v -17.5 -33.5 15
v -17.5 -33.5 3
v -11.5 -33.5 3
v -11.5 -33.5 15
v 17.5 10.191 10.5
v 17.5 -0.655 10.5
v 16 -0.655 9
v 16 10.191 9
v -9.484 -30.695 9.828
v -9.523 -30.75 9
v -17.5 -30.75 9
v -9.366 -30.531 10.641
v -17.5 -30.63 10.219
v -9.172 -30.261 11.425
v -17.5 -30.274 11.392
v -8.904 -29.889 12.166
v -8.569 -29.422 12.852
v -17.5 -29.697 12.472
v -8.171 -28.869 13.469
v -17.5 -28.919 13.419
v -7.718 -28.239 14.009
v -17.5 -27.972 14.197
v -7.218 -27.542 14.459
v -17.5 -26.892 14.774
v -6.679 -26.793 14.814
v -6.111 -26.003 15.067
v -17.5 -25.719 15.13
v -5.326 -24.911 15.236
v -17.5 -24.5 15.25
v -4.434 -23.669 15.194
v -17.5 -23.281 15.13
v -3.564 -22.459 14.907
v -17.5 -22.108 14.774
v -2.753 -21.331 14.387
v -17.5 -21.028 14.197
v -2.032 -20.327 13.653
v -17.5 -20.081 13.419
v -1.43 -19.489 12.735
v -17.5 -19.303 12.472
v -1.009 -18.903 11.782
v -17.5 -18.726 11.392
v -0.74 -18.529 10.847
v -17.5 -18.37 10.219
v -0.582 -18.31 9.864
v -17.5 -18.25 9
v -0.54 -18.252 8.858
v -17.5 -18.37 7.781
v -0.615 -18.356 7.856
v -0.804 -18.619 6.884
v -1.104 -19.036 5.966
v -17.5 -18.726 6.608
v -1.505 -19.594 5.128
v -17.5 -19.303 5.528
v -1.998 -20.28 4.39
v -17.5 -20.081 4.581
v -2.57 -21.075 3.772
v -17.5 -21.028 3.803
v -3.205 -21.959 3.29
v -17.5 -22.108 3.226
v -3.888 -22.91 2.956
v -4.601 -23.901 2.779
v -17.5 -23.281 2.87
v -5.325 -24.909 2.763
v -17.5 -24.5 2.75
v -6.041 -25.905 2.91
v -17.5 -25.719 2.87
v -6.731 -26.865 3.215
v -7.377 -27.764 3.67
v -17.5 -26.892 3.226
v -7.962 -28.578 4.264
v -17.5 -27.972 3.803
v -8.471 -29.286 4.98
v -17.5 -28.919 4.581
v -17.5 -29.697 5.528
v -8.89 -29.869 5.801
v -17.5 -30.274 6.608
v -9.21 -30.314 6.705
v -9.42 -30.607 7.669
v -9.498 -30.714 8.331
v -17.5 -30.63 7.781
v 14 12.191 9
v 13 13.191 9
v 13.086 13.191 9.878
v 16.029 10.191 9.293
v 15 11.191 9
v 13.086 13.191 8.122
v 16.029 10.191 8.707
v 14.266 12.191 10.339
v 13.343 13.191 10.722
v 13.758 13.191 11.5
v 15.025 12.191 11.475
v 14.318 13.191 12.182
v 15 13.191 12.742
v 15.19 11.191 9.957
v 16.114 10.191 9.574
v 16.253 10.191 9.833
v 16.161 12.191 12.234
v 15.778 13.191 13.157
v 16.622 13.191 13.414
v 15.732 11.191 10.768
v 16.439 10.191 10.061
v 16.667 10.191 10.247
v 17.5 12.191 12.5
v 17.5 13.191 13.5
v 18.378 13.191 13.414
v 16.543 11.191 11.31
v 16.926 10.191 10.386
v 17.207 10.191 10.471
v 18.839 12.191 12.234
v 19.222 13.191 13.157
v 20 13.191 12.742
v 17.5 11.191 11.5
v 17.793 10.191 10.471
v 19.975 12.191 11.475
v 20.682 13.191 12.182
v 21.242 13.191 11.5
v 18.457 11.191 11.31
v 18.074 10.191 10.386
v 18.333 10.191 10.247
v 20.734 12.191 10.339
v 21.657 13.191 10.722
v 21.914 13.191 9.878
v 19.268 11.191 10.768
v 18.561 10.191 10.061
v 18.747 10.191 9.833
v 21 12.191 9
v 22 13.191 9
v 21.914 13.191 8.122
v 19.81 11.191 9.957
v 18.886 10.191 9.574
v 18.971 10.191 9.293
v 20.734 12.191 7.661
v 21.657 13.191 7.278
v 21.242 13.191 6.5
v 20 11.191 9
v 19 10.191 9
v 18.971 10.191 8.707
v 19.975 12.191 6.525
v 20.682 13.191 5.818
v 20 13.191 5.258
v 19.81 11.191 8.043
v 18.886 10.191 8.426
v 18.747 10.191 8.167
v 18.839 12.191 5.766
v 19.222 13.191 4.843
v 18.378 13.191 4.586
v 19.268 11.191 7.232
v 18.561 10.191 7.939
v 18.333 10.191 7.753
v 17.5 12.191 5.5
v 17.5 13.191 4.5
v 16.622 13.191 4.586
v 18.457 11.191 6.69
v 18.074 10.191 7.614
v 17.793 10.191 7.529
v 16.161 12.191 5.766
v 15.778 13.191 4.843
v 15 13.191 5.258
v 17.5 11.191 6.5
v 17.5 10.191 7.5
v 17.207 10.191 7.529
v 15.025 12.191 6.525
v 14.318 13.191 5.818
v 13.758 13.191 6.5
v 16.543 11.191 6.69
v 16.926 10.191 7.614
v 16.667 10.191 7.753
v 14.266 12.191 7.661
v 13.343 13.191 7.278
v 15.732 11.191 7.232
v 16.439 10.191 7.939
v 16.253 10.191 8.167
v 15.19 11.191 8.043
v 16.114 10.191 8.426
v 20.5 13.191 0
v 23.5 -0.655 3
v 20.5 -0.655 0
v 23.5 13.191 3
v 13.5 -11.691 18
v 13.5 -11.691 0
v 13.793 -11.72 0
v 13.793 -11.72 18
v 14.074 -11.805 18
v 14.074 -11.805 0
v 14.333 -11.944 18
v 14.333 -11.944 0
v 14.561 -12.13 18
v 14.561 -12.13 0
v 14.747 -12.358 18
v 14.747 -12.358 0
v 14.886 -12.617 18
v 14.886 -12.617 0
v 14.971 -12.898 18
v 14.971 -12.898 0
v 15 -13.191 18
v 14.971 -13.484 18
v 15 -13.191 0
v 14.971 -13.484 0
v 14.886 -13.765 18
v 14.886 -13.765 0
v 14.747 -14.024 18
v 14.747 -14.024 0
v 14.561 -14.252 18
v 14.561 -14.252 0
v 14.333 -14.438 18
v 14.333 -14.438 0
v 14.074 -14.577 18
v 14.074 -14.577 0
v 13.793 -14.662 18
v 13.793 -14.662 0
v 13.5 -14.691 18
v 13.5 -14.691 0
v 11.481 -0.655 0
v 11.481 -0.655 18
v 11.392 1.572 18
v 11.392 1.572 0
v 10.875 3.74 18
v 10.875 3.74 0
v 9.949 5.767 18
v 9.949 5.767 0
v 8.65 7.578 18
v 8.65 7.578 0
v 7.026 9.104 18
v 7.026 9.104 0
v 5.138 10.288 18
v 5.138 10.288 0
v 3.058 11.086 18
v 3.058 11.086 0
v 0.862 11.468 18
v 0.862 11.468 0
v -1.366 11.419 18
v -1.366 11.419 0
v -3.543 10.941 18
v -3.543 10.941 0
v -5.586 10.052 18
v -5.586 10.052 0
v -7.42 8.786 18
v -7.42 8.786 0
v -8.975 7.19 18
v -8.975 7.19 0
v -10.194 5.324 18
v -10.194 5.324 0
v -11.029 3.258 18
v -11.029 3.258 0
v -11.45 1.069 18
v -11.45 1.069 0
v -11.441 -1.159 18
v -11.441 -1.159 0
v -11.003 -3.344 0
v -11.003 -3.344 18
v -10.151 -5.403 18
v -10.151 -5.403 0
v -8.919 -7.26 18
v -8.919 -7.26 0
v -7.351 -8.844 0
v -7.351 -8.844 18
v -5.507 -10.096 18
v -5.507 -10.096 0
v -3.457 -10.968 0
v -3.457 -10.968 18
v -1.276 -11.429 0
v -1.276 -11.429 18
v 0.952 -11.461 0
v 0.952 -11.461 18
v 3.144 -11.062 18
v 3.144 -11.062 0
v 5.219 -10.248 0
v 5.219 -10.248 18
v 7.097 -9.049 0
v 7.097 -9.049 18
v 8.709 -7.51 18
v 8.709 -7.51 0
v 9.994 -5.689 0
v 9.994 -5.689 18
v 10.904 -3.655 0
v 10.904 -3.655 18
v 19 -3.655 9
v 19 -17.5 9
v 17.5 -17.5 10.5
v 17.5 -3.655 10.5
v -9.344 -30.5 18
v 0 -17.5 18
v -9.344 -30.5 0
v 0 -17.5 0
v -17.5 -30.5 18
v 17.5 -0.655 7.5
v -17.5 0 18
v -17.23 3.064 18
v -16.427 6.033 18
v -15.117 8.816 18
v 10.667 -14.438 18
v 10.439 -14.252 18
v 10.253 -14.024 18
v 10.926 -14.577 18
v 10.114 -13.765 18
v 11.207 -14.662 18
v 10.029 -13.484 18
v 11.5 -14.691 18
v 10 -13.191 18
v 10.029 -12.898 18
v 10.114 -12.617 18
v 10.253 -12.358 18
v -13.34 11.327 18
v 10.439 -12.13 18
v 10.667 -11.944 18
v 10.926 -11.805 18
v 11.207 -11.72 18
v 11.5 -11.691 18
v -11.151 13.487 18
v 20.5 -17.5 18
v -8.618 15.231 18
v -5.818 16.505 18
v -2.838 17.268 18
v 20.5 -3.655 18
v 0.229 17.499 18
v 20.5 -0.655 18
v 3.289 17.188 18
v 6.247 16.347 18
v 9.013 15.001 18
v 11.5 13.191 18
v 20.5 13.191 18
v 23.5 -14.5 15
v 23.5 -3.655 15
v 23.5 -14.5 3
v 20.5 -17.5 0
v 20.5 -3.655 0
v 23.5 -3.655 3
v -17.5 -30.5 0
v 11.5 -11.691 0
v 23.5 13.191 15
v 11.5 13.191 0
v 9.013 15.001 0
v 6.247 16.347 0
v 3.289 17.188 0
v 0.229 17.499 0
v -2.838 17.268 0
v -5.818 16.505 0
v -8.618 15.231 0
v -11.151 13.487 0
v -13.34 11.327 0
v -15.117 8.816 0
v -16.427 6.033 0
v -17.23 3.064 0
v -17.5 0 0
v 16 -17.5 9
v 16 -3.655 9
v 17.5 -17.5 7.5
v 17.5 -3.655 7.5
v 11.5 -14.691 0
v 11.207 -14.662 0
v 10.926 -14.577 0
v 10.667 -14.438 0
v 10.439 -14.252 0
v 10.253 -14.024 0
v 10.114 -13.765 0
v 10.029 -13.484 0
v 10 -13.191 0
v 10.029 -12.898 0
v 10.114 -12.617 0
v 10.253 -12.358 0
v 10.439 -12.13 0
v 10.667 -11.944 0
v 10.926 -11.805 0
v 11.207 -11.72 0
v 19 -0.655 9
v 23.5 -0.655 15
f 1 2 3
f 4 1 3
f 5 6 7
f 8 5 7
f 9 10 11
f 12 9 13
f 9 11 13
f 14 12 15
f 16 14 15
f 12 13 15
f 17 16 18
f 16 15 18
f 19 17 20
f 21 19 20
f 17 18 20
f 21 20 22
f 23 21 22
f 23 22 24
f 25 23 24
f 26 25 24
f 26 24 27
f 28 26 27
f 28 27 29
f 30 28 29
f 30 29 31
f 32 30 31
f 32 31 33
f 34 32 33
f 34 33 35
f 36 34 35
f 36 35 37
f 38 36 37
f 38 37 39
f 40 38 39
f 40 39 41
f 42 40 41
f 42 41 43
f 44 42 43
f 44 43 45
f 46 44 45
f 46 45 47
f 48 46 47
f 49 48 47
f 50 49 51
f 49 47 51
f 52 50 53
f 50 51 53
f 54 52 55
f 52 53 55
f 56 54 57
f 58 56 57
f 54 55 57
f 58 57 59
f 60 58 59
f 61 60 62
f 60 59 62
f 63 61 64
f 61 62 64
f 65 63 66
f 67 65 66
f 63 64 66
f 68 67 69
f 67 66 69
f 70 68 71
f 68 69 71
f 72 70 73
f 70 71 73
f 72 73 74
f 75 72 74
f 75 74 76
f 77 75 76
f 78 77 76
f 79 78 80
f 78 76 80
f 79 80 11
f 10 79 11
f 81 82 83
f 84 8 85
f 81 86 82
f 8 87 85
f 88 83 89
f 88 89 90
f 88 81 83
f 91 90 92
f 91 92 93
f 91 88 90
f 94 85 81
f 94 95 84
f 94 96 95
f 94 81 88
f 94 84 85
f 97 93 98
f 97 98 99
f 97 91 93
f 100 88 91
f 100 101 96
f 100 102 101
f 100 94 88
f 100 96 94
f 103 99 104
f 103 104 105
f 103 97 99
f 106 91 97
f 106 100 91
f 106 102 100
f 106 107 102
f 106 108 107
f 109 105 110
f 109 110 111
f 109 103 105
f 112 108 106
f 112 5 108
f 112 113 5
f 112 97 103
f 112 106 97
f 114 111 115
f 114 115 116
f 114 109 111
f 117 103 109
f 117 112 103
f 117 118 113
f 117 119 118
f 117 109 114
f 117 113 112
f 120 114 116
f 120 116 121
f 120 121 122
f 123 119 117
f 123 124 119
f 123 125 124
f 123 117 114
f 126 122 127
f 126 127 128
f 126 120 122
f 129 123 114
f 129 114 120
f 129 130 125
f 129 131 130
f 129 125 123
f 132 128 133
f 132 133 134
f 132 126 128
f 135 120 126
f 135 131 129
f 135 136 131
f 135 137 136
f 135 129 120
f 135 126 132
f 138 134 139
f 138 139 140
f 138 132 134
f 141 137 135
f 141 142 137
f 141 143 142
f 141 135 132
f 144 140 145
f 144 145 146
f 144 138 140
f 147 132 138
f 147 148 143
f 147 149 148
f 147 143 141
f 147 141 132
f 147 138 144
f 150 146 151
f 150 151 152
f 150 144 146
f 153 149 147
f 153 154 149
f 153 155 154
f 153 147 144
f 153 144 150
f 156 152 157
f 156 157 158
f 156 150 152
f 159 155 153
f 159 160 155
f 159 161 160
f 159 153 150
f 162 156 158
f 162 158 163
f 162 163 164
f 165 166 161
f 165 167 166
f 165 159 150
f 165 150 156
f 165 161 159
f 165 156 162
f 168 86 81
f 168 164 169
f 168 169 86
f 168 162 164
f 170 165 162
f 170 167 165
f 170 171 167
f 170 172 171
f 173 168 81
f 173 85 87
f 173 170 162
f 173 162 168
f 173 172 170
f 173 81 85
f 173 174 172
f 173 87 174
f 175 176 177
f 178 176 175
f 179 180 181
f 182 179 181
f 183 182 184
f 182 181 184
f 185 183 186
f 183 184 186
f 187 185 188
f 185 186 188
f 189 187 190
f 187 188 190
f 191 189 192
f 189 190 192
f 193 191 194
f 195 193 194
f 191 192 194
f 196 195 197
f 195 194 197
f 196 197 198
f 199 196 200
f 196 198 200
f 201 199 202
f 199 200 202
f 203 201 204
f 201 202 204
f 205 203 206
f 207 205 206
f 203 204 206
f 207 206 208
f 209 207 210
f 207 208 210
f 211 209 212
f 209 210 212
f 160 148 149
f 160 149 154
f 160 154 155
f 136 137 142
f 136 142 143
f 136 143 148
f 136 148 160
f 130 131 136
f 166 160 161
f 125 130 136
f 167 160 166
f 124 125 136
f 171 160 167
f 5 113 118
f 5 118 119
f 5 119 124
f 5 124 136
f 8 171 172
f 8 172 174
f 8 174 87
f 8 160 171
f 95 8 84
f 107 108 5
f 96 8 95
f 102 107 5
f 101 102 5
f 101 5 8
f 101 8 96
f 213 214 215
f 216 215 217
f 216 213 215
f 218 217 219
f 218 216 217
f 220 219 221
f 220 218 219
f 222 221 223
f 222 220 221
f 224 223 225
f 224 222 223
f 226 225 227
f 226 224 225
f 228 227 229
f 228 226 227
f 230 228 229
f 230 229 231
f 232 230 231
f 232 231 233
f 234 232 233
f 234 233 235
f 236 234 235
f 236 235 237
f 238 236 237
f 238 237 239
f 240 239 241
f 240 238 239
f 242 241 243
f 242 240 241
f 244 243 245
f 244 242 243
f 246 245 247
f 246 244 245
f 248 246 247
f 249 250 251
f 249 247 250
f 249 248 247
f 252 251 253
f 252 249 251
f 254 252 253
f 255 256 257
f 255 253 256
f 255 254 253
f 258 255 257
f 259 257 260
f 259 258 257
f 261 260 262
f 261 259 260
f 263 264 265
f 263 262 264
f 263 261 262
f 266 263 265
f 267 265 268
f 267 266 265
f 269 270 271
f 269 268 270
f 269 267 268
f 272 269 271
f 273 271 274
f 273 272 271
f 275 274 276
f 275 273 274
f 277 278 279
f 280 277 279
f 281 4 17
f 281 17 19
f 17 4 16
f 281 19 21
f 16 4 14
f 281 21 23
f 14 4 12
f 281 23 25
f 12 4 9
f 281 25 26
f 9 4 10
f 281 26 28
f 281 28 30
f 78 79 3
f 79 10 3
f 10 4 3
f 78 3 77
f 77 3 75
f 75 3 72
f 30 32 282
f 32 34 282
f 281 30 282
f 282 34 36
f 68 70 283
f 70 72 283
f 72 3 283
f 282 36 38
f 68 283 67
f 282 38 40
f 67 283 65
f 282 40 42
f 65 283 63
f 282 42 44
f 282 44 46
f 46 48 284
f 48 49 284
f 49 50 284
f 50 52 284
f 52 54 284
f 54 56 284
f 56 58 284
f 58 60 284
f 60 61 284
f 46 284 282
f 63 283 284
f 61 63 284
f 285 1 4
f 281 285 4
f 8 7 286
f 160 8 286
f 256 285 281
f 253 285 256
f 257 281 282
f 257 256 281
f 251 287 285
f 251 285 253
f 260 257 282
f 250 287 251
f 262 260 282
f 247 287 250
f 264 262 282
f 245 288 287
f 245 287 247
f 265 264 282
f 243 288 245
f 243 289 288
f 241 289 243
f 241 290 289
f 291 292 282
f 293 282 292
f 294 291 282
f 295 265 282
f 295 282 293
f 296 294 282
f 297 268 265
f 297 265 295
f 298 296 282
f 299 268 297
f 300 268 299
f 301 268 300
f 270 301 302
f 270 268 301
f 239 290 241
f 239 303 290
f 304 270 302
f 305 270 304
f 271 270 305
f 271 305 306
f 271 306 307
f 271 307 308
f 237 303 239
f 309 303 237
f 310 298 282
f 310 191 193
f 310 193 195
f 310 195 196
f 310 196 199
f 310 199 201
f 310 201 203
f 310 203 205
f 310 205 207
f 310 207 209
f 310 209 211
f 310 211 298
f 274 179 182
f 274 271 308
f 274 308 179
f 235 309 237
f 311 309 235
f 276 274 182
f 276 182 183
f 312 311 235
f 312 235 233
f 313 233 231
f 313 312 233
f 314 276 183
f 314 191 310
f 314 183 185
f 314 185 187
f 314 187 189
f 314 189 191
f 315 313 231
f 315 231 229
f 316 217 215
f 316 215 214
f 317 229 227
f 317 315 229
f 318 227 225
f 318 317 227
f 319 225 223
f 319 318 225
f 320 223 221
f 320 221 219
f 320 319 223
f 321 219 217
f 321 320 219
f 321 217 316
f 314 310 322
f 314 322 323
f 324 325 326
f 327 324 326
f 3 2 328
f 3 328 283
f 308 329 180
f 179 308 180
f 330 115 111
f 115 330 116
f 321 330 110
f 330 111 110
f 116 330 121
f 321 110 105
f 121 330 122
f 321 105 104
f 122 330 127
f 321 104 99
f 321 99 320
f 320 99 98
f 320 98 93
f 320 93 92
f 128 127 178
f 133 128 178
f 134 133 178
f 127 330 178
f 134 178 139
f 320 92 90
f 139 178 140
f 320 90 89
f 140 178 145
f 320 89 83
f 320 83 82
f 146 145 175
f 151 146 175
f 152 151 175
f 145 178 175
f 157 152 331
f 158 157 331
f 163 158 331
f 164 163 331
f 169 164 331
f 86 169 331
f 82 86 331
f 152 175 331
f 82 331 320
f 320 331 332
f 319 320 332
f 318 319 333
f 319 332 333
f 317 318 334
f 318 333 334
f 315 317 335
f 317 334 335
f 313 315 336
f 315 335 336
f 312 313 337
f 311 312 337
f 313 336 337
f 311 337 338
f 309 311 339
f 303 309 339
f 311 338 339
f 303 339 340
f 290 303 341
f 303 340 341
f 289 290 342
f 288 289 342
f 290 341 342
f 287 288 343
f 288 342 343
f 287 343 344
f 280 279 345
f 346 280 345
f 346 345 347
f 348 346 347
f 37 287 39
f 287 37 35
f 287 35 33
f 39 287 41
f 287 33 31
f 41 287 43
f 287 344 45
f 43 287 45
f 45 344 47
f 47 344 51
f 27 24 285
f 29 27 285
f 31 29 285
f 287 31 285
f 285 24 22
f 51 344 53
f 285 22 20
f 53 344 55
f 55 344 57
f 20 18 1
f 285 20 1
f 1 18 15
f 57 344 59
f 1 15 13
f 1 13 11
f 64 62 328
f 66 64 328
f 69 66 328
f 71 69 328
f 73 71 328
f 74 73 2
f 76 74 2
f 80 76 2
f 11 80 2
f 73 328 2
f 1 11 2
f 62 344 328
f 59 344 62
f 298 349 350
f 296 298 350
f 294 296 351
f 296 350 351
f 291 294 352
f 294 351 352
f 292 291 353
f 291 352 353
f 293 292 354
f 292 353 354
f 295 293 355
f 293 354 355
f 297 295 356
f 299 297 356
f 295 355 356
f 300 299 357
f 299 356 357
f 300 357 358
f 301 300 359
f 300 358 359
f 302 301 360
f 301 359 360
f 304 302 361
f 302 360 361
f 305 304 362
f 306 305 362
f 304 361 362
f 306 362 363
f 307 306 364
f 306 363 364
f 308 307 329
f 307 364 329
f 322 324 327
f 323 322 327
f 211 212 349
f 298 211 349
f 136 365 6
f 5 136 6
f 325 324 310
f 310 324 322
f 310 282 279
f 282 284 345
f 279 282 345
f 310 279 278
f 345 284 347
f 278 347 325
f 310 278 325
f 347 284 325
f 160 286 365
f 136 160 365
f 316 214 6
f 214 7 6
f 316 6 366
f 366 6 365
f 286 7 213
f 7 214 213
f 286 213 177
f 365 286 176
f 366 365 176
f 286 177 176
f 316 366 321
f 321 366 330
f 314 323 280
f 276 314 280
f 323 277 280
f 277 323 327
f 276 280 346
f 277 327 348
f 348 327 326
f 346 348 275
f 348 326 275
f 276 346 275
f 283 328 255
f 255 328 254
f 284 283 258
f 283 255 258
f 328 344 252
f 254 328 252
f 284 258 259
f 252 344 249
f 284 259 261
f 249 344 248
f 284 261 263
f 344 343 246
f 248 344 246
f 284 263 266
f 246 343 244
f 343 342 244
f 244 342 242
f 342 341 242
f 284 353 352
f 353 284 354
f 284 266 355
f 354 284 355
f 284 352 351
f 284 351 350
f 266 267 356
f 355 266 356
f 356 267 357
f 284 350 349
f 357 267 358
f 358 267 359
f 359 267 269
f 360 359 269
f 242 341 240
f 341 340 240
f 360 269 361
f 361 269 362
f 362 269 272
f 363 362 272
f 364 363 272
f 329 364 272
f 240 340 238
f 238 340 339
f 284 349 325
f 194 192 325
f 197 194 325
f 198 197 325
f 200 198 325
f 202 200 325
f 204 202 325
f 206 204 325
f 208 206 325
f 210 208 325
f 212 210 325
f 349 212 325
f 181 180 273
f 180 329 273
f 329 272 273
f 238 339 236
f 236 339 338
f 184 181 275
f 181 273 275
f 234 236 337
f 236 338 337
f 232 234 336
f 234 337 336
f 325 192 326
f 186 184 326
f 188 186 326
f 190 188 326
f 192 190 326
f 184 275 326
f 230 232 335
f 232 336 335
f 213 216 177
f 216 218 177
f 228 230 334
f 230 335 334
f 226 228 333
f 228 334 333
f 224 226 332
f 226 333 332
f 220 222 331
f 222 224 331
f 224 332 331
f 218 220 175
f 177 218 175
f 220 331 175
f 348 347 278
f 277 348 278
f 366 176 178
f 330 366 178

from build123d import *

# Parameters (mm, degrees)
F0_R     = 11.5
F1_DEPTH = 18
F2_R     = 6.25
F3_DEPTH = 41.001
F4_R     = 4.5
F5_DEPTH = 3
F6_SIZE  = 2.99999
F7_DEPTH = 46.6919059583
F9_DEPTH = 18.001
F10_SIZE = 3
F11_SIZE = 3


# Not quite as in the source:
# - a fillet or chamfer is up to 0.001 mm smaller than in the source, because OpenCascade refuses the exact size


with BuildPart() as f1:
    # F0 (on Top) → F1 (new body)
    with BuildSketch(Plane.XY):
        with BuildLine():
            Line((-17.5, 0), (-17.5, -33.5))
            Line((-17.5, -33.5), (-11.5, -33.5))
            Line((-11.5, -33.5), (0, -17.5))
            Line((0, -17.5), (23.5, -17.5))
            Line((23.5, -17.5), (23.5, -13.1909059583))
            Line((23.5, -13.1909059583), (23.5, 13.1909059583))
            Line((23.5, 13.1909059583), (11.5, 13.1909059583))
            ThreePointArc((11.5, 13.1909059583), (-7.2456883731, 15.9295323221), (-17.5, 0))
        make_face()
        with BuildLine():
            Line((13.5, -14.6909059583), (11.5, -14.6909059583))
            ThreePointArc((11.5, -14.6909059583), (10, -13.1909059583), (11.5, -11.6909059583))
            Line((11.5, -11.6909059583), (13.5, -11.6909059583))
            ThreePointArc((13.5, -11.6909059583), (15, -13.1909059583), (13.5, -14.6909059583))
        make_face(mode=Mode.SUBTRACT)
        Circle(F0_R, mode=Mode.SUBTRACT)
    extrude(amount=F1_DEPTH)

    # F2 (on face) → F3 (cut, through all)
    with BuildSketch(Plane(origin=(-17.5, 0, 0), x_dir=(0, -1, 0), z_dir=(-1, 0, 0))):
        with Locations((24.5, 9)):
            Circle(F2_R)
    extrude(amount=-F3_DEPTH, mode=Mode.SUBTRACT)

    # F4 (on face) → F5 (cut)
    with BuildSketch(Plane(origin=(0, 13.1909059583, 0), x_dir=(-1, 0, 0), z_dir=(0, 1, 0))):
        with Locations((-17.5, 9)):
            Circle(F4_R)
        Polygon((-19, 9), (-17.5, 10.5), (-16, 9), (-17.5, 7.5), align=None, mode=Mode.SUBTRACT)
    extrude(amount=-F5_DEPTH, mode=Mode.SUBTRACT)

    # F6 (size 3 in the source; OpenCascade refuses exactly that, so slightly less here)
    f6_edges = [f1.edges().sort_by_distance(p)[0] for p in [
        (22, 10.190906, 9),
    ]]
    chamfer(f6_edges, length=F6_SIZE)

    # F7 (cut, through all): a face of the model
    f7_faces = [f1.faces().sort_by_distance(p)[0] for p in [
        (17.5, 13.1909059583, 9),
    ]]
    extrude(f7_faces, amount=-F7_DEPTH, mode=Mode.SUBTRACT)

    # F8 (on face) → F9 (cut, through all)
    with BuildSketch(Plane(origin=(0, 0, 0), x_dir=(1, 0, 0), z_dir=(0, 0, -1))):
        with BuildLine():
            Line((23.5, 0.6545470209), (23.5, 3.6545470209))
            Line((23.5, 3.6545470209), (10.9038656481, 3.6545470209))
            ThreePointArc((10.9038656481, 3.6545470209), (11.2926769611, 2.1738093411), (11.4813574196, 0.6545470209))
            Line((11.4813574196, 0.6545470209), (23.5, 0.6545470209))
        make_face()
    extrude(amount=-F9_DEPTH, mode=Mode.SUBTRACT)

    # F10
    f10_edges = [f1.edges().sort_by_distance(p)[0] for p in [
        (23.5, 6.268179, 0),
        (23.5, 6.268179, 18),
        (23.5, -10.577274, 0),
        (23.5, -10.577274, 18),
        (23.5, -17.5, 9),
    ]]
    chamfer(f10_edges, length=F10_SIZE)

    # F11
    f11_edges = [f1.edges().sort_by_distance(p)[0] for p in [
        (-14.5, -33.5, 18),
        (-14.5, -33.5, 0),
    ]]
    chamfer(f11_edges, length=F11_SIZE)


solid = f1.part
